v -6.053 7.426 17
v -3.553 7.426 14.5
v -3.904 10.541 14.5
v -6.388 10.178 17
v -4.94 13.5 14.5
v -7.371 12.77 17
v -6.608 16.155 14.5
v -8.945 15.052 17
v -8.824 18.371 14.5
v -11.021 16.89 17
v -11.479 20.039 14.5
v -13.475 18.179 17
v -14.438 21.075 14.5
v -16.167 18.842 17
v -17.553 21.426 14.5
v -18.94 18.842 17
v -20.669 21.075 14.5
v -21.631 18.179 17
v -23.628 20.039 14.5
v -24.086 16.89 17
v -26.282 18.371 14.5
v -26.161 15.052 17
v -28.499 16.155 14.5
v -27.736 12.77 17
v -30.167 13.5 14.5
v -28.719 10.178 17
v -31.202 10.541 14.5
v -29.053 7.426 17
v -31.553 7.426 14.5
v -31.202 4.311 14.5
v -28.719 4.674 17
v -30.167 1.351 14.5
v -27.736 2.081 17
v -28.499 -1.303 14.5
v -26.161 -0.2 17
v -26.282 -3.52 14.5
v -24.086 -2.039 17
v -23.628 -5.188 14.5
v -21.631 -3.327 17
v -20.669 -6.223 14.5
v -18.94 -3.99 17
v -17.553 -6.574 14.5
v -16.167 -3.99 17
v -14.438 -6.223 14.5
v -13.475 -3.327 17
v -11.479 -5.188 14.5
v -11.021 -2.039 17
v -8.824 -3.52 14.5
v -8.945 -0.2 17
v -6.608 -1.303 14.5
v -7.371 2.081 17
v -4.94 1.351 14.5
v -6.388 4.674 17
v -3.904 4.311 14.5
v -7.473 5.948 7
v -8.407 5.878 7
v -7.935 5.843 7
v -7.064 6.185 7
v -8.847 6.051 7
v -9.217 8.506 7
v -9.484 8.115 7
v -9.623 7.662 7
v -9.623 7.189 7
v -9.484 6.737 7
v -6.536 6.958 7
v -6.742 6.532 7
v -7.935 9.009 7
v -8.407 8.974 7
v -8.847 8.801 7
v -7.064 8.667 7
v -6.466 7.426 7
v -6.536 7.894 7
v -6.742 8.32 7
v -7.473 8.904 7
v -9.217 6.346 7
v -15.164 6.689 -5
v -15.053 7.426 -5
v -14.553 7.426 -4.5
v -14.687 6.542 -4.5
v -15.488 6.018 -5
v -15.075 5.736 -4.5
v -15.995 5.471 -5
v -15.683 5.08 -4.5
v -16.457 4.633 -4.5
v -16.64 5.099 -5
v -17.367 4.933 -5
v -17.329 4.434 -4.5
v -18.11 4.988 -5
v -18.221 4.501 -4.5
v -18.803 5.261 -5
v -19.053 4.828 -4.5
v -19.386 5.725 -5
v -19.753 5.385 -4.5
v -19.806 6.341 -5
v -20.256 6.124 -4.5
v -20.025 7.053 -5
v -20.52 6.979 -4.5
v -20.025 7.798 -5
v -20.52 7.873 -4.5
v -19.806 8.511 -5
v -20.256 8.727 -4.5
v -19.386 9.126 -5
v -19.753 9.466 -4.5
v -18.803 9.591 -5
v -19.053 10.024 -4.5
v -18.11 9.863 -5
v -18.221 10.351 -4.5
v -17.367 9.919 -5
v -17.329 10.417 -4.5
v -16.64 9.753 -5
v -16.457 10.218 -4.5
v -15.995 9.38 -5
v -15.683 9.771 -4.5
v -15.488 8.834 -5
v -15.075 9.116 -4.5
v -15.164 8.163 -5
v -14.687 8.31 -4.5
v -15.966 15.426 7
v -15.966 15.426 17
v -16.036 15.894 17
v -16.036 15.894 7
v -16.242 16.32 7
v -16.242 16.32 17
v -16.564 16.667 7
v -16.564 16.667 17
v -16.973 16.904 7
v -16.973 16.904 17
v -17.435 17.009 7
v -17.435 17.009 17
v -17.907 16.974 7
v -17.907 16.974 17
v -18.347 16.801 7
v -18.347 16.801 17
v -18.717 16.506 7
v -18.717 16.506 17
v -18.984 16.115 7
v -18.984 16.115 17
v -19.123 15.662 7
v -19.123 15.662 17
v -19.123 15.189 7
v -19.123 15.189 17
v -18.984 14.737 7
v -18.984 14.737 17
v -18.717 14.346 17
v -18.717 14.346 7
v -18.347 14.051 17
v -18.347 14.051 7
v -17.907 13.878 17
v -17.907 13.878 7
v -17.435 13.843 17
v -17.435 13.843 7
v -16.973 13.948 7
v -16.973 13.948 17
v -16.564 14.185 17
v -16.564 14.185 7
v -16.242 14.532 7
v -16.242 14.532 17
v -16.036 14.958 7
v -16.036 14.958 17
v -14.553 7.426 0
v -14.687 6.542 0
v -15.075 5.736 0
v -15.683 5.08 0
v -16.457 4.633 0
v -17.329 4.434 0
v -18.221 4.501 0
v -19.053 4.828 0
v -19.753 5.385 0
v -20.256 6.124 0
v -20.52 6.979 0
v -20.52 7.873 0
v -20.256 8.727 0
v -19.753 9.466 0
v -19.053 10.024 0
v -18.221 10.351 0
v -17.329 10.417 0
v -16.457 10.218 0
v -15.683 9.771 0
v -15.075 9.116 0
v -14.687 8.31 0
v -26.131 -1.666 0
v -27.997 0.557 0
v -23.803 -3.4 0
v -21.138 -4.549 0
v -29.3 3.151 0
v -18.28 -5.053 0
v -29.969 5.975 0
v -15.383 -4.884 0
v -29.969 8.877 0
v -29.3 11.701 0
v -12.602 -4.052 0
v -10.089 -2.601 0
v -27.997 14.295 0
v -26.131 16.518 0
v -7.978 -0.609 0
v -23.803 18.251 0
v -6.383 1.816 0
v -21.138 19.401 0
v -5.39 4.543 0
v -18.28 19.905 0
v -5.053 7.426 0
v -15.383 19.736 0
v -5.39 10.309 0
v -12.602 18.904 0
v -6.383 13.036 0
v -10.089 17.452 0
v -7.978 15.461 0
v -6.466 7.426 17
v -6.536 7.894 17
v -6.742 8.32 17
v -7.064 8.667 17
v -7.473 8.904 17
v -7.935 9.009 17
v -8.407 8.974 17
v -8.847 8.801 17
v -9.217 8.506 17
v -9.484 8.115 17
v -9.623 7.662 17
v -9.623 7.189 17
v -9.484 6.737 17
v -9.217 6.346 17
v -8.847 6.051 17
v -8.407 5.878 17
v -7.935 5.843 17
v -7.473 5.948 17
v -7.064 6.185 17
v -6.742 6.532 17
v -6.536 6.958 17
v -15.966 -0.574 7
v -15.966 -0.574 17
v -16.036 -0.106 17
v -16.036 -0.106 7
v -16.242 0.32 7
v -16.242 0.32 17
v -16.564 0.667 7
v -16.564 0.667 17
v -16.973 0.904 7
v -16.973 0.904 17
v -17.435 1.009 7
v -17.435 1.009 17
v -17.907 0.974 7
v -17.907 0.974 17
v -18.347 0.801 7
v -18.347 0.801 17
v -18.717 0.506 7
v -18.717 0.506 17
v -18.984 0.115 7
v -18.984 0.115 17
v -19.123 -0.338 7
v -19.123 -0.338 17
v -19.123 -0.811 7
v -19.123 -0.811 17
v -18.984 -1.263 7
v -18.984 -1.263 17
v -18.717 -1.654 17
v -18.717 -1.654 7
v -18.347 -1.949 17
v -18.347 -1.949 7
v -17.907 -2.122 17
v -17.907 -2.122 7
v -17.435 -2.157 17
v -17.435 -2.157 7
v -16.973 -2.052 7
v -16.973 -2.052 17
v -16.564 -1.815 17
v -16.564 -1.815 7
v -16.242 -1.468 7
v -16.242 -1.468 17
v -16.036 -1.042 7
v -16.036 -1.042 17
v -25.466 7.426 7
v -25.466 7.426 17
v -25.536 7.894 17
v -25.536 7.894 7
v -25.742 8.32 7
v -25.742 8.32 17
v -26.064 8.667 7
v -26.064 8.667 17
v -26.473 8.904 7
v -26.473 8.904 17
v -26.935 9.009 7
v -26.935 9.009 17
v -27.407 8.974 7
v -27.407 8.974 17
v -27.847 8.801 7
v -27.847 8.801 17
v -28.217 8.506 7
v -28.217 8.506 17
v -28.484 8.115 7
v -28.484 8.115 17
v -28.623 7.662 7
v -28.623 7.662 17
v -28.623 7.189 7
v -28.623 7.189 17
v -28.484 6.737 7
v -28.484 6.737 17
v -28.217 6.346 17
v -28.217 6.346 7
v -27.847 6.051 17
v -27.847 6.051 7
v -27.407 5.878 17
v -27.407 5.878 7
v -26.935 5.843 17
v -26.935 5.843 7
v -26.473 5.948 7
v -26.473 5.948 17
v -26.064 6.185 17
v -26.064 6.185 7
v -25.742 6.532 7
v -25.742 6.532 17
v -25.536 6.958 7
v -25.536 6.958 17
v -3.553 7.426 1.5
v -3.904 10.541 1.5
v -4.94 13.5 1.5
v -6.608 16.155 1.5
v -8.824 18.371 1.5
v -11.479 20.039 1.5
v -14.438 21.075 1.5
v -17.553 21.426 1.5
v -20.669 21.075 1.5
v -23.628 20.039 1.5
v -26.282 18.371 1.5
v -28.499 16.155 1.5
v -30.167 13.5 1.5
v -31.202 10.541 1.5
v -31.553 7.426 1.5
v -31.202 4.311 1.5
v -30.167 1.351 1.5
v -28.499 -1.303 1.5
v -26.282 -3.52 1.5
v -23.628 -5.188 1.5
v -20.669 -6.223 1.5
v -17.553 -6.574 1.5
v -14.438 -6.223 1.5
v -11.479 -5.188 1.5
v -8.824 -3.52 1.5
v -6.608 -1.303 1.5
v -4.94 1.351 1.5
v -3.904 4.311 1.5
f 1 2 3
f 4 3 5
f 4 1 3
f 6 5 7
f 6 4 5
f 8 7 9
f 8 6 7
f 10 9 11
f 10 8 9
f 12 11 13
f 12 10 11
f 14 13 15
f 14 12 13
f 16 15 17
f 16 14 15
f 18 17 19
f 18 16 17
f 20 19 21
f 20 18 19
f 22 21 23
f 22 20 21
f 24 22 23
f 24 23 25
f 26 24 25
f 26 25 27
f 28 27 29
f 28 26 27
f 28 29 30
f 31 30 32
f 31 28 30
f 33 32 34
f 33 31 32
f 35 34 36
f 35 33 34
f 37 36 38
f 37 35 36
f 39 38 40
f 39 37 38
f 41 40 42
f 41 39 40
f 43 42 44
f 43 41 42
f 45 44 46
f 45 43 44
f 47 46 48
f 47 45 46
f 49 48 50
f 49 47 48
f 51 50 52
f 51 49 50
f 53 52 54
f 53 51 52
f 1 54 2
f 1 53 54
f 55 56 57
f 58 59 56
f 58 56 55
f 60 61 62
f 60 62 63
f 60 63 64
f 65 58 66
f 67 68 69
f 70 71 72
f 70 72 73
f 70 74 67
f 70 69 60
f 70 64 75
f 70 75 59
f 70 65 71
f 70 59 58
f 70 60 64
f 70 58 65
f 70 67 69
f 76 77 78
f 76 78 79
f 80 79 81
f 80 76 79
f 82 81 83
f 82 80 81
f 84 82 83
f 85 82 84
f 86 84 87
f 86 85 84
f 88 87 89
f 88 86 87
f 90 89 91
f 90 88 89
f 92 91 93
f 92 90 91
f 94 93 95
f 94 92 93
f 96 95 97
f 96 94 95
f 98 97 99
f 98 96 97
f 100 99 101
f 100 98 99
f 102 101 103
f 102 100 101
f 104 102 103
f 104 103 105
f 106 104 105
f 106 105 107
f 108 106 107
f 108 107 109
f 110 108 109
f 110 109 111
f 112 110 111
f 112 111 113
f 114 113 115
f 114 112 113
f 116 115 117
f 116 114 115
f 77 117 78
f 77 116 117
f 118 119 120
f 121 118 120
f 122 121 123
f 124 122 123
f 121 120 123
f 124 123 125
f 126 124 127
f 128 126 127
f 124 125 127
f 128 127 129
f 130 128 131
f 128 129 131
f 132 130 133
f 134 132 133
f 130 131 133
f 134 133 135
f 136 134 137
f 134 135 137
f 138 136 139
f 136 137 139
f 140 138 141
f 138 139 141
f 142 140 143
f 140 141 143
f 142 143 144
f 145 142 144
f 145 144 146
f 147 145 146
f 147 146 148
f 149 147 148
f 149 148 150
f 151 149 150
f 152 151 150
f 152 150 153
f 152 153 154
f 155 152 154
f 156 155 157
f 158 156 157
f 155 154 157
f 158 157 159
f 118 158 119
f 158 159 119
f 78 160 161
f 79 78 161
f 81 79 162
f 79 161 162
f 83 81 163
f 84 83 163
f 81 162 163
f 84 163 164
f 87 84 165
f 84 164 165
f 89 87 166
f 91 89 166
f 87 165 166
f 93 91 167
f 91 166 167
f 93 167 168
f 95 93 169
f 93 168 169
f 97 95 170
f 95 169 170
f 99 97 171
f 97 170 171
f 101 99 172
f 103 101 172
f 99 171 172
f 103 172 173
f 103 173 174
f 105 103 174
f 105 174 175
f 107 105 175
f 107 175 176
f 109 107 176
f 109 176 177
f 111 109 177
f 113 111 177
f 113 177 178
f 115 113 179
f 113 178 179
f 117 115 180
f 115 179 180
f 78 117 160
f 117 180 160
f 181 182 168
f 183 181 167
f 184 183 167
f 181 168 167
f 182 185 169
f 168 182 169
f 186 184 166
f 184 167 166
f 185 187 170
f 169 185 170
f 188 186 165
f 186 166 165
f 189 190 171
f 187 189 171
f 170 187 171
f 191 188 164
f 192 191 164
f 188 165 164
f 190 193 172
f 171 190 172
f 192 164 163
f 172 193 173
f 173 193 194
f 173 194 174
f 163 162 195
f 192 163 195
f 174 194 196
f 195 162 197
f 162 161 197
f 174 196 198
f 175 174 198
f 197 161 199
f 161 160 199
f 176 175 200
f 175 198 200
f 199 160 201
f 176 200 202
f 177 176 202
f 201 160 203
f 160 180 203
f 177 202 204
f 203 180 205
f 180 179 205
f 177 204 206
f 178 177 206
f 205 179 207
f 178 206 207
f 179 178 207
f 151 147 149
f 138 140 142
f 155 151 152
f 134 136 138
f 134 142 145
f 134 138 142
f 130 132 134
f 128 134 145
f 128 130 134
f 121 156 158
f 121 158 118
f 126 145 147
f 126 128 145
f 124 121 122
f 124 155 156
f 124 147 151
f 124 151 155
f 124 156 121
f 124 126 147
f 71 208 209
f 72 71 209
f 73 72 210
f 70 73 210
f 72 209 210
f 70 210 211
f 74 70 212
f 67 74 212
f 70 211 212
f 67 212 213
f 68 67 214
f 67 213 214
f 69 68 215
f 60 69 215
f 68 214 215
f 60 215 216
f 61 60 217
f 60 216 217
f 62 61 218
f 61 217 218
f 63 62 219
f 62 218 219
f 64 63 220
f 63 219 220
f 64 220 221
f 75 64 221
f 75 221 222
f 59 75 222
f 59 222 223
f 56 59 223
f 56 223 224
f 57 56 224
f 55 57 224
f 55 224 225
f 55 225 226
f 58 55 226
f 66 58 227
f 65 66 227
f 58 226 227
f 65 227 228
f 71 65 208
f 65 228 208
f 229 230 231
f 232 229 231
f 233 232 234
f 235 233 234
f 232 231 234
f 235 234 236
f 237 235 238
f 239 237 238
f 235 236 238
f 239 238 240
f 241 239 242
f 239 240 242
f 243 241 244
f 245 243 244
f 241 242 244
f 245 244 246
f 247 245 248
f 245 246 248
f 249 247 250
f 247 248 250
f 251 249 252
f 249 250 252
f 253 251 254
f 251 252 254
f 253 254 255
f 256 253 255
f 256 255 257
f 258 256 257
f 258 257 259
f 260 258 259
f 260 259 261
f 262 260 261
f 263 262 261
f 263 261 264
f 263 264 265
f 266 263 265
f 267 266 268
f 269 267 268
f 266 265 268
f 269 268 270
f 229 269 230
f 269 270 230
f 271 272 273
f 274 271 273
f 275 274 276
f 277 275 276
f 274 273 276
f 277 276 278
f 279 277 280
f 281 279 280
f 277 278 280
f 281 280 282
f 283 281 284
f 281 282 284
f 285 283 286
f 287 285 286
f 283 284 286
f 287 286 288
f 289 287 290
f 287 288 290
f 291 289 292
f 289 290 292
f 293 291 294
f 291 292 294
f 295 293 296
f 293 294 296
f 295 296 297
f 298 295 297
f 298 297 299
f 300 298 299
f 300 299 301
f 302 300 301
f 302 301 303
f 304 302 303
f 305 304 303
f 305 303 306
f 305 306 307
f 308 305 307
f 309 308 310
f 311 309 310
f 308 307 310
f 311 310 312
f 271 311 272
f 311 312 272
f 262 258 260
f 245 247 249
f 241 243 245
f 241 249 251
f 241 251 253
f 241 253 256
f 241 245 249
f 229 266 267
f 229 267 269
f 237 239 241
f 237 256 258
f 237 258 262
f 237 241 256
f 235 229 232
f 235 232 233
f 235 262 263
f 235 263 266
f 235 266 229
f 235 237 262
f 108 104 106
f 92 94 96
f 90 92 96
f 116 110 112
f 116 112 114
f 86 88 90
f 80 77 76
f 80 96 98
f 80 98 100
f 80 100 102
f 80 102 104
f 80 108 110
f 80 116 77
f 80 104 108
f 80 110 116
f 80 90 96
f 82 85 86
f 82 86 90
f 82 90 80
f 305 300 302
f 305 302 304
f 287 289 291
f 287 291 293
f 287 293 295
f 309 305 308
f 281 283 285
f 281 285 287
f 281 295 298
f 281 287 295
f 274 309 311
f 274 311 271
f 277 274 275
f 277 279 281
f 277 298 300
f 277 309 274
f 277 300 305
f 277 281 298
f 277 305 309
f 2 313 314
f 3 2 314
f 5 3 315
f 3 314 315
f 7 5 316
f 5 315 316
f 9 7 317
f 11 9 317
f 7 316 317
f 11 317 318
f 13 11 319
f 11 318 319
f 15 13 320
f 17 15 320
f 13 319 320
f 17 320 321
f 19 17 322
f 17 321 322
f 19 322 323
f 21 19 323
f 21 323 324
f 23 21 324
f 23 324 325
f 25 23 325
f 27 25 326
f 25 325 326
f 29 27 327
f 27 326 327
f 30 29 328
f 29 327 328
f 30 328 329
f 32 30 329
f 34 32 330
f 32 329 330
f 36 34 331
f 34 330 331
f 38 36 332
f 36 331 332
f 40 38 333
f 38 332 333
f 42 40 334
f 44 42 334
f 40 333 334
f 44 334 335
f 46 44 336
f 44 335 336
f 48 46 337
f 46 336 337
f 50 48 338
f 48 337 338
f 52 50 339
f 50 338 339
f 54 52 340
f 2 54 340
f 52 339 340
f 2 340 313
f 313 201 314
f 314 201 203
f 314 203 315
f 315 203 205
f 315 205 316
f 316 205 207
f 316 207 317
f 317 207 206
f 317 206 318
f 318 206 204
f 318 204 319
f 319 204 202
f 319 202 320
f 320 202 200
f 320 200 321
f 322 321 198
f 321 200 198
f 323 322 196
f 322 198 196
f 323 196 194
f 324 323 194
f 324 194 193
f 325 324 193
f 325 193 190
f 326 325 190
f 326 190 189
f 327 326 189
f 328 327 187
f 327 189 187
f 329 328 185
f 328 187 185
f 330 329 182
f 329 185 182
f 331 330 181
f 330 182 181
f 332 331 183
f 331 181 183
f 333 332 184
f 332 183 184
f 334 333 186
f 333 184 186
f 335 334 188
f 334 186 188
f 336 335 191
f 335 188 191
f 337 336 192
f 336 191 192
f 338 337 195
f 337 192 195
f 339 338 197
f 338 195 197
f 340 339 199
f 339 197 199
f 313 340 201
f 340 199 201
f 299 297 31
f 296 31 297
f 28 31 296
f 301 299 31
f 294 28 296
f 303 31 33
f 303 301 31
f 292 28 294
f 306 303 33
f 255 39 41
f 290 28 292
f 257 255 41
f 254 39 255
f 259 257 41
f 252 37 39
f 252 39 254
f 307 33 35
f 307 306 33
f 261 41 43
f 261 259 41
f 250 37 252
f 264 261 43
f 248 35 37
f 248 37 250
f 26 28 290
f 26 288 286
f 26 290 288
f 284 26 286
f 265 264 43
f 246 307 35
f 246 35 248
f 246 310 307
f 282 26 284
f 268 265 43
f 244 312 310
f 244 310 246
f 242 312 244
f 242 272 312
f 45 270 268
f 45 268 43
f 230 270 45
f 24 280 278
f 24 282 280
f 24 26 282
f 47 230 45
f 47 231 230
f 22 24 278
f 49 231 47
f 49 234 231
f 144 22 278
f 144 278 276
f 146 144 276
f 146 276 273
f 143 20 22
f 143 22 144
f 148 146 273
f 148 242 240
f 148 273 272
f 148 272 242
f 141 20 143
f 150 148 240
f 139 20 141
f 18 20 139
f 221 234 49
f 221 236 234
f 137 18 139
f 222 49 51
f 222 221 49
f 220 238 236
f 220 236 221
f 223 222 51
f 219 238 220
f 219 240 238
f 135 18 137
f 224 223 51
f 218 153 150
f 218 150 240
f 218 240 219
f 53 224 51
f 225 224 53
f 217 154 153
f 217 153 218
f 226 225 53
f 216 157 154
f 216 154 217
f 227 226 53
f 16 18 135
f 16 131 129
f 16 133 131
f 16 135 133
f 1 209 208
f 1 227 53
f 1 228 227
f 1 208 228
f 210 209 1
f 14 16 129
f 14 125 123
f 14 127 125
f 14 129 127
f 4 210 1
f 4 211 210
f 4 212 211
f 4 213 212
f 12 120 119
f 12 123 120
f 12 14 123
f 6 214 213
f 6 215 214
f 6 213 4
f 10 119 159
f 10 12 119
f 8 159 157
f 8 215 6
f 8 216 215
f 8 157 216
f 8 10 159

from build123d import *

# Parameters (mm, degrees)
SKETCH1_R           = 14
BOSS_EXTRUDE1_DEPTH = 17
SKETCH2_R           = 3
BOSS_EXTRUDE2_DEPTH = 5
SKETCH3_R           = 1.5875
CUT_EXTRUDE2_DEPTH  = 10
CHAMFER1_SIZE       = 1.5
CHAMFER2_SIZE       = 0.5
CHAMFER3_SIZE       = 2.5


with BuildPart() as part:
    # Sketch1 → Boss-Extrude1 (new body)
    with BuildSketch(Plane.XY):
        with Locations((-17.5533458, 7.425814207)):
            Circle(SKETCH1_R)
    extrude(amount=BOSS_EXTRUDE1_DEPTH)

    # Sketch2 → Boss-Extrude2 (add)
    with BuildSketch(Plane(origin=(0, -0.075436545, 0), x_dir=(-1, 0, 0), z_dir=(0, 0, -1))):
        with Locations((17.5533458, 7.501250752)):
            Circle(SKETCH2_R)
    extrude(amount=BOSS_EXTRUDE2_DEPTH)

    # Sketch3 → Cut-Extrude2 (cut)
    with BuildSketch(Plane.XY.offset(17)):
        with Locations((-17.5533458, 15.425814207)):
            Circle(SKETCH3_R)
        with Locations((-17.5533458, -0.574185793)):
            Circle(SKETCH3_R)
        with Locations((-27.0533458, 7.425814207)):
            Circle(SKETCH3_R)
        with Locations((-8.0533458, 7.425814207)):
            Circle(SKETCH3_R)
    extrude(amount=-CUT_EXTRUDE2_DEPTH, mode=Mode.SUBTRACT)

    # Chamfer1
    chamfer1_edges = [part.edges().sort_by_distance(p)[0] for p in [
        (-31.5533458, 7.425814207, 0),
    ]]
    chamfer(chamfer1_edges, length=CHAMFER1_SIZE)

    # Chamfer2
    chamfer2_edges = [part.edges().sort_by_distance(p)[0] for p in [
        (-14.5533458, 7.425814207, -5),
    ]]
    chamfer(chamfer2_edges, length=CHAMFER2_SIZE)

    # Chamfer3
    chamfer3_edges = [part.edges().sort_by_distance(p)[0] for p in [
        (-31.5533458, 7.425814207, 17),
    ]]
    chamfer(chamfer3_edges, length=CHAMFER3_SIZE)


solid = part.part
